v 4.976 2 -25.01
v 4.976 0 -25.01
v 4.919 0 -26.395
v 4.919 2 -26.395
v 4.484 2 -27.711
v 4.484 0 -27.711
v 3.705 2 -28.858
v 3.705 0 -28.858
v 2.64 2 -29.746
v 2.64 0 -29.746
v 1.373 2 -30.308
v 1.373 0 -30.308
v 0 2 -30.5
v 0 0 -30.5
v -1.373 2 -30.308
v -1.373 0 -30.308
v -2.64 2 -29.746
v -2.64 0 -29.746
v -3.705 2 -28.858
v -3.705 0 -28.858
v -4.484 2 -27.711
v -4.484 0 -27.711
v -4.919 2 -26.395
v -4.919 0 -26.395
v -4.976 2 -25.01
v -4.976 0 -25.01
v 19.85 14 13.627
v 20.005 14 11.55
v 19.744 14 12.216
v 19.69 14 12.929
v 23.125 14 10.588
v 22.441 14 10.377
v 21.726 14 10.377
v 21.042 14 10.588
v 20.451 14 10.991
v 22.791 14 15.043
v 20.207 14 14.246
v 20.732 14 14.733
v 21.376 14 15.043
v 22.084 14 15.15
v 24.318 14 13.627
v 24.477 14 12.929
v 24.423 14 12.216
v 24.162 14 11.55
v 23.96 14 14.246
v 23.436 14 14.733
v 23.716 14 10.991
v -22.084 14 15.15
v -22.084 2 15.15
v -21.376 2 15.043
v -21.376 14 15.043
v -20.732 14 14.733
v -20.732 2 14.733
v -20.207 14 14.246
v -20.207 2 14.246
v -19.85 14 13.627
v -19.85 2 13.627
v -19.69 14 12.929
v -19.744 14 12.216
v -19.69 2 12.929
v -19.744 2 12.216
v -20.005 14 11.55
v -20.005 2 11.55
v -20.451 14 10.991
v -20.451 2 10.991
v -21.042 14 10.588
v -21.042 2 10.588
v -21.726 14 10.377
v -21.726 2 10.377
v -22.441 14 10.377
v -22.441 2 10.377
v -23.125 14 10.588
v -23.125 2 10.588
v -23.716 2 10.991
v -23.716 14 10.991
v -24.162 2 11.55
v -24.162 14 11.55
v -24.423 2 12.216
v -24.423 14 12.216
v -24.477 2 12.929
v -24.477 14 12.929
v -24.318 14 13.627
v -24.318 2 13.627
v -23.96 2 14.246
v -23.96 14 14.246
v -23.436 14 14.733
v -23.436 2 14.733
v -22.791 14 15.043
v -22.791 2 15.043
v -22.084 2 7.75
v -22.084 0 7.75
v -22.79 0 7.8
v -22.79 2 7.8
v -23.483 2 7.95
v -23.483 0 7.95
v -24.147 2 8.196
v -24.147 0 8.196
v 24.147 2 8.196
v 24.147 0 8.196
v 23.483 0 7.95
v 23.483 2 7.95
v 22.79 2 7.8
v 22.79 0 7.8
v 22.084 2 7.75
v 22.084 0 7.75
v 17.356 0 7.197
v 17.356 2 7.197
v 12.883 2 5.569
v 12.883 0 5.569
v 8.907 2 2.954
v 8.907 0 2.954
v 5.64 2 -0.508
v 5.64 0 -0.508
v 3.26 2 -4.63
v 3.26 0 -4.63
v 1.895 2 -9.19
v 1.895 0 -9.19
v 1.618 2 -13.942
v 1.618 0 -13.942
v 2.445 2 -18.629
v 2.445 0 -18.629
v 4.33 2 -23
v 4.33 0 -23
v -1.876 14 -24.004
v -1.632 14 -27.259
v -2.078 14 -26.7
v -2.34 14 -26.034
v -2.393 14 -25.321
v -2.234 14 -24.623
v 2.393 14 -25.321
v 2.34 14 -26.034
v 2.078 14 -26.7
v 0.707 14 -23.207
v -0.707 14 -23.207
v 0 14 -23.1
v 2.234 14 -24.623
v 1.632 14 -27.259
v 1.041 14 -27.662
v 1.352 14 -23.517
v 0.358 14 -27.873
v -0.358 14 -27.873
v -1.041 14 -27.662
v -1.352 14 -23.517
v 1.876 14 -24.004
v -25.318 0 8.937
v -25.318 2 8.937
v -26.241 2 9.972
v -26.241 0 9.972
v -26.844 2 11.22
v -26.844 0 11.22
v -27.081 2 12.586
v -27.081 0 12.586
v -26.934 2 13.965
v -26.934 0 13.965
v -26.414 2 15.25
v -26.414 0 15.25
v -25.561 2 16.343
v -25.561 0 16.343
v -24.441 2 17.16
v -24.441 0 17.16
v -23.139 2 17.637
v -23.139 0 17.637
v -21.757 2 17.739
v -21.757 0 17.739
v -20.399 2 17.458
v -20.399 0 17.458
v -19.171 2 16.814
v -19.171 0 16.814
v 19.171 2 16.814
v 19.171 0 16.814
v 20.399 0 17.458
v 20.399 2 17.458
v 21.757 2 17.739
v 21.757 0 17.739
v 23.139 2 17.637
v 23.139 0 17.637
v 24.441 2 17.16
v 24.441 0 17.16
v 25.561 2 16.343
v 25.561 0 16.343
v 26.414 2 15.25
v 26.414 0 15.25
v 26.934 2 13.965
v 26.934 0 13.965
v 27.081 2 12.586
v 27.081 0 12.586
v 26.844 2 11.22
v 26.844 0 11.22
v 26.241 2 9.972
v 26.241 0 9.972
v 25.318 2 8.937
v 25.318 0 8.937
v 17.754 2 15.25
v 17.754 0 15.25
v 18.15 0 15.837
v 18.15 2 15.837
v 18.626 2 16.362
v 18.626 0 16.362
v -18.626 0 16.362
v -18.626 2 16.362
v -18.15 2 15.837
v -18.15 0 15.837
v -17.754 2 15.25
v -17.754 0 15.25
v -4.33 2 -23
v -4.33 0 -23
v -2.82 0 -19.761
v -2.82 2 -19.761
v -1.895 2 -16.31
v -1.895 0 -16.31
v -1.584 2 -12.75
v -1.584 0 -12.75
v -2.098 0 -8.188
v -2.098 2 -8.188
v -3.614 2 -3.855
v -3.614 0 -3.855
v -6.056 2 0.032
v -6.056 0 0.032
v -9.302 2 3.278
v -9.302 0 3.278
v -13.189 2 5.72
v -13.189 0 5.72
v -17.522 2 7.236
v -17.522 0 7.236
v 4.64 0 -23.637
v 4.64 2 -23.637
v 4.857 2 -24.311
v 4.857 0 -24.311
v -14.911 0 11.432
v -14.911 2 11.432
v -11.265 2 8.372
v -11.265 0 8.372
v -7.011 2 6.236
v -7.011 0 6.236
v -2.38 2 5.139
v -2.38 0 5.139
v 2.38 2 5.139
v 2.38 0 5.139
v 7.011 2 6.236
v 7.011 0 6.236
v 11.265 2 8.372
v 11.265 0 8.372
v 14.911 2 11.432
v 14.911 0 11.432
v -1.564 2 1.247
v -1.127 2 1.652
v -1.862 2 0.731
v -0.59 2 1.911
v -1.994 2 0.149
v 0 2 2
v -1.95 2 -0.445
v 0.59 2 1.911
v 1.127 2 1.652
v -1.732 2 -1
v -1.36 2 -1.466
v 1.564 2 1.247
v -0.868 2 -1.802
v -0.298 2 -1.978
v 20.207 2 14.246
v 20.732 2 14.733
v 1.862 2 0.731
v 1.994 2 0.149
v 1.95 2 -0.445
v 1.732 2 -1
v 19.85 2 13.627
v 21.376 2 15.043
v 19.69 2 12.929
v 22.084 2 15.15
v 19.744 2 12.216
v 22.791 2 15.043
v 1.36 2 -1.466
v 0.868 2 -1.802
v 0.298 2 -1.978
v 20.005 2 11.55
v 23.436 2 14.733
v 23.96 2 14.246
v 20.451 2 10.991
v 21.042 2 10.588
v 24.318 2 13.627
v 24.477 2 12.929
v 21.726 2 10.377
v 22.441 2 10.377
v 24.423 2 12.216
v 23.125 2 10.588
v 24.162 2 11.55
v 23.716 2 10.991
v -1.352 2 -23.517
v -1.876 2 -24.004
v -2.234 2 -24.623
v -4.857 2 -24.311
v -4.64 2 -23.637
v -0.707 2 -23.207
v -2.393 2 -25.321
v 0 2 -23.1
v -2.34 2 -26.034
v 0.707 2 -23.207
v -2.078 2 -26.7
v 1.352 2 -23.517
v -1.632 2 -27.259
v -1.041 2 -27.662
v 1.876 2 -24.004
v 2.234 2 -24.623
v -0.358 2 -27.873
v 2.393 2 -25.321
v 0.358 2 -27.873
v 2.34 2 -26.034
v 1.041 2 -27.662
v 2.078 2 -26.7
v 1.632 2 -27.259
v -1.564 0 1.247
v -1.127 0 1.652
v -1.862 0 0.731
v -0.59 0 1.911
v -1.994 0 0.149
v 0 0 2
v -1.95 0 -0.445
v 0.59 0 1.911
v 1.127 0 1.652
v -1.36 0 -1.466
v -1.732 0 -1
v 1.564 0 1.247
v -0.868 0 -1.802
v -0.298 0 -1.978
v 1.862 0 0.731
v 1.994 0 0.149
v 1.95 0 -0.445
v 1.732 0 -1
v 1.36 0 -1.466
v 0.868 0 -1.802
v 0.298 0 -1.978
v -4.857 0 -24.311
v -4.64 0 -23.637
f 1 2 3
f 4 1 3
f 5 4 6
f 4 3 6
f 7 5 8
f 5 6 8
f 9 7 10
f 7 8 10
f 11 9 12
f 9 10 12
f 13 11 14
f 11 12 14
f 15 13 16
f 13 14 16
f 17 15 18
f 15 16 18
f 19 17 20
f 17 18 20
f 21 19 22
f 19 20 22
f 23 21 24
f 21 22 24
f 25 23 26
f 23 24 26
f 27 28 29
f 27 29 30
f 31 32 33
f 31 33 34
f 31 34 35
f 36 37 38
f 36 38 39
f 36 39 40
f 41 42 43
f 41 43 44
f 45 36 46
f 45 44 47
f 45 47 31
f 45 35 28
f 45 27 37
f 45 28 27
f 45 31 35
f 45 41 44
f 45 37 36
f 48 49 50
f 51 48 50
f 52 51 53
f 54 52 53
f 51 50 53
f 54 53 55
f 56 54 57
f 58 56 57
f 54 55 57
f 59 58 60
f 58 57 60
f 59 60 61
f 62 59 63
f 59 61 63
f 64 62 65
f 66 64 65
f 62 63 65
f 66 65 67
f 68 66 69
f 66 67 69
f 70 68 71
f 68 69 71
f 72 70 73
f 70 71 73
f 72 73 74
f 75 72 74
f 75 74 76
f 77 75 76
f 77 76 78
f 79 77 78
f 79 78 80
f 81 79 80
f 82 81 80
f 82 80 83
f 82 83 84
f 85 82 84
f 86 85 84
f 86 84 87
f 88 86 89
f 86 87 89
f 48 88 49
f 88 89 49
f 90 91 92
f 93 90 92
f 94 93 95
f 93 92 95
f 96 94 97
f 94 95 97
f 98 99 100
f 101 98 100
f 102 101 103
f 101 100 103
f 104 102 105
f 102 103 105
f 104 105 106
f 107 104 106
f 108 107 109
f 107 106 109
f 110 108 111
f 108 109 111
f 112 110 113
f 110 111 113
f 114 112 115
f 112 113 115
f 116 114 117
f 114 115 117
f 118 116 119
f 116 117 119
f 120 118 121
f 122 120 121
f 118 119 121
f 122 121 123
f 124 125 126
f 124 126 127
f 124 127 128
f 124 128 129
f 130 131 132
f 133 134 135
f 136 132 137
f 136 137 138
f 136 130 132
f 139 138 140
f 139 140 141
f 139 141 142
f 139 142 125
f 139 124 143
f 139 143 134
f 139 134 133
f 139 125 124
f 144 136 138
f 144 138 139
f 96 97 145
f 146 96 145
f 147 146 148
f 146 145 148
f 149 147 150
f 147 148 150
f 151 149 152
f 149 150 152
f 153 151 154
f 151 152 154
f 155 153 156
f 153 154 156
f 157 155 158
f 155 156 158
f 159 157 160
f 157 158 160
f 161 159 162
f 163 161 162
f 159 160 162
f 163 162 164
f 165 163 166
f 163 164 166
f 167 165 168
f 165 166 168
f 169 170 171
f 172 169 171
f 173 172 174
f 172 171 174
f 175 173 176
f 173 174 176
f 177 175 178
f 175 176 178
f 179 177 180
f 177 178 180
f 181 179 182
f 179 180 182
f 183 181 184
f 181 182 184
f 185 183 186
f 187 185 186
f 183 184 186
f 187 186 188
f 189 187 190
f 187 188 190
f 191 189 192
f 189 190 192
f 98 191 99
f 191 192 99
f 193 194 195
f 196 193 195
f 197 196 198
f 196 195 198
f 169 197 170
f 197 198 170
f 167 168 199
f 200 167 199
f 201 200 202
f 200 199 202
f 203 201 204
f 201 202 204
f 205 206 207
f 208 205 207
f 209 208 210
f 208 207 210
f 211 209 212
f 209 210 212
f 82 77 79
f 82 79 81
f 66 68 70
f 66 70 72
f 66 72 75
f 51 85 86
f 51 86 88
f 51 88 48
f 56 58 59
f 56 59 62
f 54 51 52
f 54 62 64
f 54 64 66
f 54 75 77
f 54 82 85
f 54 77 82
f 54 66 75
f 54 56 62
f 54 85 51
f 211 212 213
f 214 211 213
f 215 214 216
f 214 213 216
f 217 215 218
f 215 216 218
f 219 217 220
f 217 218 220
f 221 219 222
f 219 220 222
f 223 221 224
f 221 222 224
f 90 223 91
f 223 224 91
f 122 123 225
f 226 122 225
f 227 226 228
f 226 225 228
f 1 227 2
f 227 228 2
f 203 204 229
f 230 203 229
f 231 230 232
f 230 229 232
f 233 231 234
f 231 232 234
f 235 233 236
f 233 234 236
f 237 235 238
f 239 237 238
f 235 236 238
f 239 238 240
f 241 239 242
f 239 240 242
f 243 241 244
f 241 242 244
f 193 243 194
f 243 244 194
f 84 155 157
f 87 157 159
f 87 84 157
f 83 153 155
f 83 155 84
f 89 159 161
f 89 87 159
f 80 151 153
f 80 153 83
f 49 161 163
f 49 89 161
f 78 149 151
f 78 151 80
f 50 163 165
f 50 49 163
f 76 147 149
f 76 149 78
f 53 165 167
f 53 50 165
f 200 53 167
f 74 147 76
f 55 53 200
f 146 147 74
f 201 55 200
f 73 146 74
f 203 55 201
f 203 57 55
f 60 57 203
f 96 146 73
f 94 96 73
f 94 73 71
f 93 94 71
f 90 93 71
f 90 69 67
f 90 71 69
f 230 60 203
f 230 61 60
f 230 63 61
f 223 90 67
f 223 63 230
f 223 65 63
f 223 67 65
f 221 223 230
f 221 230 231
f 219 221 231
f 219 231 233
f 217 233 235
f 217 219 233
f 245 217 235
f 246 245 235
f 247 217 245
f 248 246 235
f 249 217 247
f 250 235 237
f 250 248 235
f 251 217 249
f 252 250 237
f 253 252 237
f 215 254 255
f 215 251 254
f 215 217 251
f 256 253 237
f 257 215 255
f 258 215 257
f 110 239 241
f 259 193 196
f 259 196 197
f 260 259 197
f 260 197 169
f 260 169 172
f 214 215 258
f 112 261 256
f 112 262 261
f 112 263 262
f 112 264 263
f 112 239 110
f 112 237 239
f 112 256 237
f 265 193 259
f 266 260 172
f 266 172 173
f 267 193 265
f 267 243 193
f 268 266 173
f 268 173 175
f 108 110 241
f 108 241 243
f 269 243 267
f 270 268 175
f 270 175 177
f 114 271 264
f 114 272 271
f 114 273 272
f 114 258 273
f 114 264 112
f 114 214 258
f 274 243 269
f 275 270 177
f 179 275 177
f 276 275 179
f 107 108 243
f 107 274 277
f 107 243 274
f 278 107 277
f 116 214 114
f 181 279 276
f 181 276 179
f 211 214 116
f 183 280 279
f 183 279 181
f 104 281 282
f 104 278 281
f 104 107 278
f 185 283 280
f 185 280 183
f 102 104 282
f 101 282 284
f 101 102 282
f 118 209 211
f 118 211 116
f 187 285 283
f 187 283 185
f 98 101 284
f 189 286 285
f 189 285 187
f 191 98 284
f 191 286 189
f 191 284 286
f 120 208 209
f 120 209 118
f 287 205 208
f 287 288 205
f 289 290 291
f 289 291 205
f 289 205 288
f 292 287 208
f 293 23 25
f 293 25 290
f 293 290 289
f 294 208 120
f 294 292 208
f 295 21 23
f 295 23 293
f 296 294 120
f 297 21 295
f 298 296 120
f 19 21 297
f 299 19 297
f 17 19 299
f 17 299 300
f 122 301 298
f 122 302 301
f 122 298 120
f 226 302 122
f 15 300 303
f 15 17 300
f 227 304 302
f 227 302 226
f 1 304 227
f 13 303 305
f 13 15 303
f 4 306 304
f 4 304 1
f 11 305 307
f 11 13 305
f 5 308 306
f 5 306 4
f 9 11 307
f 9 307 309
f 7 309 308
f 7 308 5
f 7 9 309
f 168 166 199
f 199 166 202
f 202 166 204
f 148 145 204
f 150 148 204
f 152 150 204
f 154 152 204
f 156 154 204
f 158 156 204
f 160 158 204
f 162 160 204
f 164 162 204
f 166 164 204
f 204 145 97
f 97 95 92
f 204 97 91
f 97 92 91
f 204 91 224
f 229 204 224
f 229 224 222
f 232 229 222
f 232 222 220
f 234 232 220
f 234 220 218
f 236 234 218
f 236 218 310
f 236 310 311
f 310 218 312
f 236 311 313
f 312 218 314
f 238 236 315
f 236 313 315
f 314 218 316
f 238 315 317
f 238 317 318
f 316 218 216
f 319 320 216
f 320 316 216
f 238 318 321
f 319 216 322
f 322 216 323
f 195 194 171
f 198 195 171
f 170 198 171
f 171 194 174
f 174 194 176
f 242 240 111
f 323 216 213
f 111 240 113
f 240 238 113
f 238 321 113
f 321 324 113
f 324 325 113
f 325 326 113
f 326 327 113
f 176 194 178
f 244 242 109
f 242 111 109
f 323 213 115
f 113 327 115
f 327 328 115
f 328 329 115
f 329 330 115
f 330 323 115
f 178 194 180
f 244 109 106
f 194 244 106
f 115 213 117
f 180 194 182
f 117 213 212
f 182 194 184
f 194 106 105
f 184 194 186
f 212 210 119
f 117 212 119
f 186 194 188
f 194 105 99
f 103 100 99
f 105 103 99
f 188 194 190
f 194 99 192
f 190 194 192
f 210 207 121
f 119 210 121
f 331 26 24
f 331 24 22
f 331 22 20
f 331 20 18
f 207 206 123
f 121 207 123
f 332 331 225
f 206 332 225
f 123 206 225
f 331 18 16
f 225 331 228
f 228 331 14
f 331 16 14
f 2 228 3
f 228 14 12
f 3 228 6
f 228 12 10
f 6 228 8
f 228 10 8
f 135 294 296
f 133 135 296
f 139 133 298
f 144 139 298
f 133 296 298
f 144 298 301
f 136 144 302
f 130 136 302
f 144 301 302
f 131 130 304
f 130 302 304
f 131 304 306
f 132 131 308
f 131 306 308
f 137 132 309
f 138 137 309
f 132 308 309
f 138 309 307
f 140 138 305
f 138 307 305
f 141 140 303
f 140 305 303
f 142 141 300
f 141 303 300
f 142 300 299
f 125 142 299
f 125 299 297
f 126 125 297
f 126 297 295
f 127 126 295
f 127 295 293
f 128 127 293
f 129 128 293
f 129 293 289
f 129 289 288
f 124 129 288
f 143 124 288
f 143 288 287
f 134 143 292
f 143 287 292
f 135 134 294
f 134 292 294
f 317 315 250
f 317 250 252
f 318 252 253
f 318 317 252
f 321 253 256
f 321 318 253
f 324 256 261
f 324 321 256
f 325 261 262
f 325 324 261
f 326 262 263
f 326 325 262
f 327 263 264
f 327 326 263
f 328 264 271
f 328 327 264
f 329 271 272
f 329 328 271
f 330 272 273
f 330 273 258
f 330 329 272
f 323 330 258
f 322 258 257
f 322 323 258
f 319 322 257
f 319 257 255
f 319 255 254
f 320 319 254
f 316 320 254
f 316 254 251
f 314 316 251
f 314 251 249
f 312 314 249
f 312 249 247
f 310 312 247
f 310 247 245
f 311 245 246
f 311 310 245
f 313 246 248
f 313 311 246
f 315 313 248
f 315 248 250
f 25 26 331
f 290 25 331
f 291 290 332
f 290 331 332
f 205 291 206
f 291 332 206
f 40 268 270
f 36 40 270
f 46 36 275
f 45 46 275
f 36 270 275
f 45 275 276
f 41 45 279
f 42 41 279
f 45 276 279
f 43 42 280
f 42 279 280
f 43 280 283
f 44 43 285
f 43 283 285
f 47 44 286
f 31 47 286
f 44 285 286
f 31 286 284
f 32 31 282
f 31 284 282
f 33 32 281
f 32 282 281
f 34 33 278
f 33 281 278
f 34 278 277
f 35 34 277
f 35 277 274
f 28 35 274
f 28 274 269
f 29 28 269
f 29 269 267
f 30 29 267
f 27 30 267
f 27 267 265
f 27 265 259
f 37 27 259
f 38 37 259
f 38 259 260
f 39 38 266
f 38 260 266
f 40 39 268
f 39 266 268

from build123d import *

# Parameters (mm, degrees)
SKETCH1_R           = 2.4
SKETCH1_R_2         = 2
BOSS_EXTRUDE1_DEPTH = 2
BOSS_EXTRUDE2_START = 2
SKETCH1_3_R         = 2.4
BOSS_EXTRUDE2_DEPTH = 12


with BuildPart() as part:
    # Sketch1 → Boss-Extrude1 (new body)
    # profile 1 of 4: a face of its own
    with BuildSketch(Plane(origin=(0, 0, 0), x_dir=(1, 0, 0), z_dir=(0, 1, 0))):
        with BuildLine():
            ThreePointArc((22.083647797, -7.75), (4.330127019, 2.5), (4.330127019, 23))
            ThreePointArc((4.330127019, 23), (4.760296424, 23.970432103), (4.975912761, 25.009803922))
            ThreePointArc((4.975912761, 25.009803922), (0, 30.5), (-4.975912761, 25.009803922))
            ThreePointArc((-4.975912761, 25.009803922), (-4.760296424, 23.970432103), (-4.330127019, 23))
            ThreePointArc((-4.330127019, 23), (-2.282168358, 18.055790425), (-1.583647797, 12.75))
            ThreePointArc((-1.583647797, 12.75), (-7.587958782, -1.745689014), (-22.083647797, -7.75))
            ThreePointArc((-22.083647797, -7.75), (-23.139151353, -7.862678418), (-24.14708192, -8.195635103))
            ThreePointArc((-24.14708192, -8.195635103), (-26.413774815, -15.25), (-19.171169159, -16.814168819))
            ThreePointArc((-19.171169159, -16.814168819), (-18.378854928, -16.107753684), (-17.753520778, -15.25))
            ThreePointArc((-17.753520778, -15.25), (0, -5), (17.753520778, -15.25))
            ThreePointArc((17.753520778, -15.25), (18.378854928, -16.107753684), (19.171169159, -16.814168819))
            ThreePointArc((19.171169159, -16.814168819), (26.413774815, -15.25), (24.14708192, -8.195635103))
            ThreePointArc((24.14708192, -8.195635103), (23.139151353, -7.862678418), (22.083647797, -7.75))
        make_face()
        with Locations((-22.083647797, -12.75)):
            Circle(SKETCH1_R, mode=Mode.SUBTRACT)
        with Locations((22.083647797, -12.75)):
            Circle(SKETCH1_R, mode=Mode.SUBTRACT)
        with Locations(Location((0, 0, 0), (0, 0, 270))):
            Circle(SKETCH1_R_2, mode=Mode.SUBTRACT)
        with Locations((0, 25.5)):
            Circle(SKETCH1_R, mode=Mode.SUBTRACT)
    # profile 2 of 4: a face of its own
    with BuildSketch(Plane(origin=(0, 0, 0), x_dir=(1, 0, 0), z_dir=(0, 1, 0))):
        with Locations((-22.083647797, -12.75)):
            Circle(SKETCH1_R)
    # profile 3 of 4: a face of its own
    with BuildSketch(Plane(origin=(0, 0, 0), x_dir=(1, 0, 0), z_dir=(0, 1, 0))):
        with Locations((22.083647797, -12.75)):
            Circle(SKETCH1_R)
    # profile 4 of 4: a face of its own
    with BuildSketch(Plane(origin=(0, 0, 0), x_dir=(1, 0, 0), z_dir=(0, 1, 0))):
        with Locations((0, 25.5)):
            Circle(SKETCH1_R)
    extrude(amount=BOSS_EXTRUDE1_DEPTH)

    # Sketch1<3> → Boss-Extrude2 (add)
    with BuildSketch(Plane(origin=(0, 0, 0), x_dir=(1, 0, 0), z_dir=(0, 1, 0)).offset(BOSS_EXTRUDE2_START)):
        with Locations(Location((-22.083647797, -12.75, 0), (0, 0, 270))):
            Circle(SKETCH1_3_R)
        with Locations(Location((22.083647797, -12.75, 0), (0, 0, 270))):
            Circle(SKETCH1_3_R)
        with Locations(Location((0, 25.5, 0), (0, 0, 270))):
            Circle(SKETCH1_3_R)
    extrude(amount=BOSS_EXTRUDE2_DEPTH)


solid = part.part
